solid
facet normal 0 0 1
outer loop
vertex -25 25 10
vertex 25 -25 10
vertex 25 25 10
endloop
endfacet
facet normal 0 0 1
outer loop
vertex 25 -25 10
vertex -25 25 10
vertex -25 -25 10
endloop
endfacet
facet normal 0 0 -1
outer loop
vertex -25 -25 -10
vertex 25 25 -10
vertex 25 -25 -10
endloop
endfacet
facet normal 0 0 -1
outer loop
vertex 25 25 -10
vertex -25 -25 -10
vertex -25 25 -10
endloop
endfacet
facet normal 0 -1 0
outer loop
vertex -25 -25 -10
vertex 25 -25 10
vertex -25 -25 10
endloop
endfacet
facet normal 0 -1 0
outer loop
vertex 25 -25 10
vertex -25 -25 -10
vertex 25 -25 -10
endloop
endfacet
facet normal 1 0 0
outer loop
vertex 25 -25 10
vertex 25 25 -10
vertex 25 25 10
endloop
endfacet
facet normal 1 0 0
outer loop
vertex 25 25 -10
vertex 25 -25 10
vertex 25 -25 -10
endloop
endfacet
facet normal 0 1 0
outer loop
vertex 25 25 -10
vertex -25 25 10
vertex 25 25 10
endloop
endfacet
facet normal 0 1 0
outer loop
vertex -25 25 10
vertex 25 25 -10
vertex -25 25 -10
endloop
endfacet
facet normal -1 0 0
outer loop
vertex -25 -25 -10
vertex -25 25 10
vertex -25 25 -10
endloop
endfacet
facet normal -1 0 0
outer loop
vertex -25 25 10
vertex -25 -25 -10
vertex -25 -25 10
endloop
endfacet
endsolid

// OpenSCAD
// Parameters
body_length = 50; //[25:100:1]
body_width = 50; //[25:100:1]
body_height = 20; //[10:40:1]

// Main Body Module
module main_body() {
  color("Silver") // Use a neutral color for the main body
  translate([0, 0, 0]) // Centered at origin
    cube([body_length, body_width, body_height], center=true);
}

// Final Model
union() {
  main_body();
}
